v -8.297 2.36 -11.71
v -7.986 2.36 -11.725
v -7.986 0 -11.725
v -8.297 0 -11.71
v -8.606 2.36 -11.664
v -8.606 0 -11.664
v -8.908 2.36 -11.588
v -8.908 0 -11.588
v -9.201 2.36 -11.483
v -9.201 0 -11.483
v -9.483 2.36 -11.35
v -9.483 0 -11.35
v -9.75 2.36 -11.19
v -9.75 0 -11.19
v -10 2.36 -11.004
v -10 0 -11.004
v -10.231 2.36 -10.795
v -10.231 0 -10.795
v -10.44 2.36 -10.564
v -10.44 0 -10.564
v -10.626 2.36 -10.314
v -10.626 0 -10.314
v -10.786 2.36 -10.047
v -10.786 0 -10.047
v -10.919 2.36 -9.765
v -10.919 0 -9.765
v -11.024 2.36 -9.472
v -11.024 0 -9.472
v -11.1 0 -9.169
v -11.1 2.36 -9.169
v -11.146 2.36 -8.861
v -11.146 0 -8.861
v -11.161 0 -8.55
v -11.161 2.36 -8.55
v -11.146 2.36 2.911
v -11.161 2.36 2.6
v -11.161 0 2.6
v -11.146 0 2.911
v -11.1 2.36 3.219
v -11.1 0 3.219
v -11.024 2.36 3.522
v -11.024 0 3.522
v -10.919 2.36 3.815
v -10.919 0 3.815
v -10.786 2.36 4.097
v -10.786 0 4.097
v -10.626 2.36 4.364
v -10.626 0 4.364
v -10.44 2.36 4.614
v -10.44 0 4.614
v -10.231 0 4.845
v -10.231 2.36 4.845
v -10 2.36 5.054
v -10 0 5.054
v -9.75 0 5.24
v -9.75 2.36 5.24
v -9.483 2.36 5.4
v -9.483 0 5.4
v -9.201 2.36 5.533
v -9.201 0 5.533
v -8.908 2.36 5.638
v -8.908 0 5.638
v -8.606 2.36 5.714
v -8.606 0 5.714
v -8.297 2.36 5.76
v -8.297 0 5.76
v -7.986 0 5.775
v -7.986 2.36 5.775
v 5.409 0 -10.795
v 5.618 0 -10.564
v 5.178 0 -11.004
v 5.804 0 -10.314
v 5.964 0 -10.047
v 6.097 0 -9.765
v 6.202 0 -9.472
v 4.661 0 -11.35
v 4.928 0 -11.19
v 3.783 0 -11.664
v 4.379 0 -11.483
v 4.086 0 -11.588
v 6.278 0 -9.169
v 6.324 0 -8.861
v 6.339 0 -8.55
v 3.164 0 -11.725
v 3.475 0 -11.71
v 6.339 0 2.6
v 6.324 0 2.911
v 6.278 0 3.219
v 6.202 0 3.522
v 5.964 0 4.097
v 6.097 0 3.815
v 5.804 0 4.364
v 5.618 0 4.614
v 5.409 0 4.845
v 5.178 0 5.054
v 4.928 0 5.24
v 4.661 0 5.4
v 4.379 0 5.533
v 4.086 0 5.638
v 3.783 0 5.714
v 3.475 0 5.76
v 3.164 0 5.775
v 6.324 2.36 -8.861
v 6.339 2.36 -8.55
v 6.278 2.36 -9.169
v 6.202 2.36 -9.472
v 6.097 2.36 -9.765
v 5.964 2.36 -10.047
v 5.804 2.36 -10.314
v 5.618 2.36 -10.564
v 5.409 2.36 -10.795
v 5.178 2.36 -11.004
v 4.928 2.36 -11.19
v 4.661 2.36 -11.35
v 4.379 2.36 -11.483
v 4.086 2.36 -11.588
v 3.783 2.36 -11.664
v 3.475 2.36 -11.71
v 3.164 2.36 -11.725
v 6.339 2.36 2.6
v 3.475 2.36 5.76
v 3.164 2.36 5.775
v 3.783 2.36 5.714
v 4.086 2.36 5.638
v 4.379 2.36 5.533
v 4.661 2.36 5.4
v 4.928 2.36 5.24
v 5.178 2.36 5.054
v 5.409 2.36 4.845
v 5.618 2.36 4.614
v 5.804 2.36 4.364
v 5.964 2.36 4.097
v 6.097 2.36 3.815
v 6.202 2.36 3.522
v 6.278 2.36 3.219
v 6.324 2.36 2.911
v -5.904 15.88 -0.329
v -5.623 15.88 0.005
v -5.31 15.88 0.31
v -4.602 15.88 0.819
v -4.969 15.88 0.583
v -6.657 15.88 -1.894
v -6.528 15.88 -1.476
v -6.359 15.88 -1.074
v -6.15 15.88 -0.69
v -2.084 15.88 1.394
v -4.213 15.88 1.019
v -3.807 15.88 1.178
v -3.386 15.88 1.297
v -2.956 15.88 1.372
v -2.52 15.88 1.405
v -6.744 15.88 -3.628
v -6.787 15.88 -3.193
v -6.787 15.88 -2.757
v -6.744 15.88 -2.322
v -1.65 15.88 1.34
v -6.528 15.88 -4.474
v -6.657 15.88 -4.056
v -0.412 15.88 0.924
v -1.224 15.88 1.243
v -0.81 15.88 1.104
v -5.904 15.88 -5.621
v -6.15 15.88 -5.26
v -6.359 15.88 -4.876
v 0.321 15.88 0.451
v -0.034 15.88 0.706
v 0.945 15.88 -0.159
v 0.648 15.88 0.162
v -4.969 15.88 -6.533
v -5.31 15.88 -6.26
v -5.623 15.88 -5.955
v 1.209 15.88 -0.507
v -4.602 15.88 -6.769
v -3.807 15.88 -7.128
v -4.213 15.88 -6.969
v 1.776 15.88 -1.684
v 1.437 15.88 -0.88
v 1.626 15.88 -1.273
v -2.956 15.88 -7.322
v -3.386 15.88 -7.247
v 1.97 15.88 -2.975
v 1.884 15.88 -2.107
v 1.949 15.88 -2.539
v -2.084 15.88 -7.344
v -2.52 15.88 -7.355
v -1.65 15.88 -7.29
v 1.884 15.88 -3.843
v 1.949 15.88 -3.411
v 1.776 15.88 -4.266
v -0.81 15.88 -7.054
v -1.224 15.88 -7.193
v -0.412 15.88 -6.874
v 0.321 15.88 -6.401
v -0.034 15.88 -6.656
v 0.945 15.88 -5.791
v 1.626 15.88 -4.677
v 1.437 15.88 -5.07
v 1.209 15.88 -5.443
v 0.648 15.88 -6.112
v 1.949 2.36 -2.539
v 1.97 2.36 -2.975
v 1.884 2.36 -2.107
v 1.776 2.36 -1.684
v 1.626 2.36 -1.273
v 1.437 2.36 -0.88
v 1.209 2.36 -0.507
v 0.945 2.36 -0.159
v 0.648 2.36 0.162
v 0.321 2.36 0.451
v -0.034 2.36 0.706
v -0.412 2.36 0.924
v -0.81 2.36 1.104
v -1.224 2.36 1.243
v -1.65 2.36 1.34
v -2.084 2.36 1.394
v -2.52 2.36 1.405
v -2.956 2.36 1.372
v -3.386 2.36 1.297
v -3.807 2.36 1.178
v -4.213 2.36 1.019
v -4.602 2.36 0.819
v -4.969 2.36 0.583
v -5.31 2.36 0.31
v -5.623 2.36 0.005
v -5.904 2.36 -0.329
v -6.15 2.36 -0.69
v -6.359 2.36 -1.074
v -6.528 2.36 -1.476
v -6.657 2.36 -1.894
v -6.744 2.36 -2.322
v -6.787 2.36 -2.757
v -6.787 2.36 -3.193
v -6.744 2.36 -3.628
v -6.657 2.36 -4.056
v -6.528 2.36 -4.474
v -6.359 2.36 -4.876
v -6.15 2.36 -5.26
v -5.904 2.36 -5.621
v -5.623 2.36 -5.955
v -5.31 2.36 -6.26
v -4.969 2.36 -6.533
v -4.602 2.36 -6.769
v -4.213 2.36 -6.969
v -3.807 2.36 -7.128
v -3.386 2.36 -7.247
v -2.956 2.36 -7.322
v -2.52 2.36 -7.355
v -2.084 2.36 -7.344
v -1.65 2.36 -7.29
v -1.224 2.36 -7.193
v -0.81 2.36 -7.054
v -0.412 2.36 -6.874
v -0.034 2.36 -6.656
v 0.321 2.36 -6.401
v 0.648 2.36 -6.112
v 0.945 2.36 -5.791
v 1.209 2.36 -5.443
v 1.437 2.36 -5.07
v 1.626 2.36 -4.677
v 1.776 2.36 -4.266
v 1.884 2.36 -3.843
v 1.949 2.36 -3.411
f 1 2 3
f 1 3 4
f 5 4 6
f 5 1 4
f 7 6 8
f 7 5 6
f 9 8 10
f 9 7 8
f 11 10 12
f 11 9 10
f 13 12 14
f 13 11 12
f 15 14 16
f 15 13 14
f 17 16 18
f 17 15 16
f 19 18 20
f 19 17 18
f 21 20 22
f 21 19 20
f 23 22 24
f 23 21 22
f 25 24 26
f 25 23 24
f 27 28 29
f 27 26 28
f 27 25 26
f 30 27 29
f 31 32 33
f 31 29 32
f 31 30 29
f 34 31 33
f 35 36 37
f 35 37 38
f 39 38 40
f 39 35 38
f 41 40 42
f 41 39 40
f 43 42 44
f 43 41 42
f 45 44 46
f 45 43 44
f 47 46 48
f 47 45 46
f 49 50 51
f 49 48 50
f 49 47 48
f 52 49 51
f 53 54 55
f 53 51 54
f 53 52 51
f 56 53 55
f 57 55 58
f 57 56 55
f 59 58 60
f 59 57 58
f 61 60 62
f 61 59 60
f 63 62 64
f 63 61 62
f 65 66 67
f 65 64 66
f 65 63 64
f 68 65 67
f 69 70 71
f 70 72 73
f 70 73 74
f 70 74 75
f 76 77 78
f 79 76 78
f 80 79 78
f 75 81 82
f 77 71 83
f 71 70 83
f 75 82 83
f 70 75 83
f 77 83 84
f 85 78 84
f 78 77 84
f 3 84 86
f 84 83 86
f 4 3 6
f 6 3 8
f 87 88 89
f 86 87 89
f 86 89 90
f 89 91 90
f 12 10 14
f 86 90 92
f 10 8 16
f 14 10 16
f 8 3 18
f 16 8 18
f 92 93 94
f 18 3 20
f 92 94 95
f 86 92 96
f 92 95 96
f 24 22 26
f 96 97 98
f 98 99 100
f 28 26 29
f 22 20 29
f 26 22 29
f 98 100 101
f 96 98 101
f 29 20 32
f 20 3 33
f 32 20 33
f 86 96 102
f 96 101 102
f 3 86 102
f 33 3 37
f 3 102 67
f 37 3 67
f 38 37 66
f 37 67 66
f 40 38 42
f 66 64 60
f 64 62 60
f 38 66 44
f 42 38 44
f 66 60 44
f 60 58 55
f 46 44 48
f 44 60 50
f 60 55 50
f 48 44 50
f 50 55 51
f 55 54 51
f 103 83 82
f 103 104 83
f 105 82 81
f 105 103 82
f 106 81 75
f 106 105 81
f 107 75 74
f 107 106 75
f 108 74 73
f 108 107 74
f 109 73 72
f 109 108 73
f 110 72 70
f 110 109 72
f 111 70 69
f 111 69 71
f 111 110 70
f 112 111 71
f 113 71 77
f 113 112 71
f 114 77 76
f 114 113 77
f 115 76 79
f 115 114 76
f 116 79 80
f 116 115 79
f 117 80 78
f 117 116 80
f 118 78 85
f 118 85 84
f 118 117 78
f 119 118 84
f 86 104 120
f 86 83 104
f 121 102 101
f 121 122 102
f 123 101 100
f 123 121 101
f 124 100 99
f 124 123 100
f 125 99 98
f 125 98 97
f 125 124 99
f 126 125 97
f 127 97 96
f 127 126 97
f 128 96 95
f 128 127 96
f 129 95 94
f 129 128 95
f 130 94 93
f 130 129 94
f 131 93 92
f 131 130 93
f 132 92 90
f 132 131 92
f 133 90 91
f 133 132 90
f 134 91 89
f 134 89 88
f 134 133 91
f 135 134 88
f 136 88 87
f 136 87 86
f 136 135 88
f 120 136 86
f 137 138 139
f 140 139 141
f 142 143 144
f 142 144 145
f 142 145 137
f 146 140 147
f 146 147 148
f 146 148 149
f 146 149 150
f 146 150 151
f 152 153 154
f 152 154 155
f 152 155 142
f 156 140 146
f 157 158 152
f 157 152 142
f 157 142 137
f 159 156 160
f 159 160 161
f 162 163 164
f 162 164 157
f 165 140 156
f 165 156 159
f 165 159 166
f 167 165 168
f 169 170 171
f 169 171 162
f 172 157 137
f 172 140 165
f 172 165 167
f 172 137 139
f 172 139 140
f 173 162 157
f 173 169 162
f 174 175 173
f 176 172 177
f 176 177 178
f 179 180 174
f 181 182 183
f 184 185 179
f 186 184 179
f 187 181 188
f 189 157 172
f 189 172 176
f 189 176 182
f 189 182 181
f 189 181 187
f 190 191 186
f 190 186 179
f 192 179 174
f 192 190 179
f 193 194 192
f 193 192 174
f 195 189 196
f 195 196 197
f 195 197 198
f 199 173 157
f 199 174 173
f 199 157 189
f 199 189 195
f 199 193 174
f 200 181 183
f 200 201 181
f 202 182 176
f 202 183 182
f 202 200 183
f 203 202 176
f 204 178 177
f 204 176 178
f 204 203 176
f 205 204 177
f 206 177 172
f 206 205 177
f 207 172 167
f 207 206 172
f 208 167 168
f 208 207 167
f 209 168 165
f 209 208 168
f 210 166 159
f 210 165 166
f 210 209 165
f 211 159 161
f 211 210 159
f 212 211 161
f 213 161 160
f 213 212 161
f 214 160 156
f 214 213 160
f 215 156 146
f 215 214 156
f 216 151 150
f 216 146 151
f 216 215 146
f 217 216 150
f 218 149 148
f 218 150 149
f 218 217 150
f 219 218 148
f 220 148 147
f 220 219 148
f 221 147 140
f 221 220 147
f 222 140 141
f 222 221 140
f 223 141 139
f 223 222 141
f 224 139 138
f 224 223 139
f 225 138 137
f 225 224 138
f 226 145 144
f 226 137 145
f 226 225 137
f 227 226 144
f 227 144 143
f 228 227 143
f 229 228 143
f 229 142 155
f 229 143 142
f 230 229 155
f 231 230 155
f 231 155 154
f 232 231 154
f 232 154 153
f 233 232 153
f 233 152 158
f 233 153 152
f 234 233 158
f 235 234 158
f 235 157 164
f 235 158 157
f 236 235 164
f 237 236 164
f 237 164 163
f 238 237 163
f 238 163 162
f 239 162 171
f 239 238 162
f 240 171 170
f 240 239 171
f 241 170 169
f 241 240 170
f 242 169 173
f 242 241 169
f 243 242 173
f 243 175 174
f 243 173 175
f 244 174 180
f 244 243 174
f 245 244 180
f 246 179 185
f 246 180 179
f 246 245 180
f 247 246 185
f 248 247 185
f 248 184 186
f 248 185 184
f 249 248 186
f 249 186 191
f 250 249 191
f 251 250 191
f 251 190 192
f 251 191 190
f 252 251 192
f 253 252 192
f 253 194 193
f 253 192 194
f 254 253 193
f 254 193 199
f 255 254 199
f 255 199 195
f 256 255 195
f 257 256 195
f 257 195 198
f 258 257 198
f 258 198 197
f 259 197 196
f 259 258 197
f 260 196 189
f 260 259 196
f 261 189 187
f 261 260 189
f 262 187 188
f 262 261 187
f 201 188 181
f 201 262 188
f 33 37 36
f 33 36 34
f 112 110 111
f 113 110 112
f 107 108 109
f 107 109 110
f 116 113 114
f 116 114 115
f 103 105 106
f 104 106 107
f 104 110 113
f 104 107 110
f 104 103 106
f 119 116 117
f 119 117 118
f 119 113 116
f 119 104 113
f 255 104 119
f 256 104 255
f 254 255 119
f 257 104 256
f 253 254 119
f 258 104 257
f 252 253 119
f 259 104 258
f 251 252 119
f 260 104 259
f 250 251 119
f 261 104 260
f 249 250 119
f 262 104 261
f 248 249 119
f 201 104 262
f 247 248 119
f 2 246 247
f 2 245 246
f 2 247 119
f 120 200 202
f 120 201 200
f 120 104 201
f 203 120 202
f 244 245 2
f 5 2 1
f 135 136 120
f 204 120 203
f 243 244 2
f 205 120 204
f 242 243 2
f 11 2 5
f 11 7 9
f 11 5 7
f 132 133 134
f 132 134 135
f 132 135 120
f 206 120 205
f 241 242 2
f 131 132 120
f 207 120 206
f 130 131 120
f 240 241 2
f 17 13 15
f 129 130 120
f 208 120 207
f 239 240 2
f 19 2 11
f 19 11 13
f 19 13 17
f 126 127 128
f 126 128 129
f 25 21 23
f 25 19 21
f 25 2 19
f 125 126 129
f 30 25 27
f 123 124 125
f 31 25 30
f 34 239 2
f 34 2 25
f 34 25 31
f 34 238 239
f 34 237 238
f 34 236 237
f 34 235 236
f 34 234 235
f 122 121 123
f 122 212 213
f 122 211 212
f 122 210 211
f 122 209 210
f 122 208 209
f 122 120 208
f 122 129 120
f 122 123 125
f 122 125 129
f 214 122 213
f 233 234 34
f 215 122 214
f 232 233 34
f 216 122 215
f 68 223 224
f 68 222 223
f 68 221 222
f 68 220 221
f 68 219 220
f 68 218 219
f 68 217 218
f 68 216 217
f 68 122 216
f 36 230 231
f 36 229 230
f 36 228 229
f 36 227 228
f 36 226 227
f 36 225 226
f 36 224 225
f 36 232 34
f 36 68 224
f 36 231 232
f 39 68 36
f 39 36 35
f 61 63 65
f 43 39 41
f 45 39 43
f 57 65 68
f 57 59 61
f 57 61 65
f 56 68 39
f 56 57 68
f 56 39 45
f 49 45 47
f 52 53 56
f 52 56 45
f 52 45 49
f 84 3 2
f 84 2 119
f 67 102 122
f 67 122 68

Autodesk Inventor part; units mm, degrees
ref_plane "YZ Plane" through (0, 0, 0) normal (1, 0, 0) x (0, 1, 0)
ref_plane "XZ Plane" through (0, 0, 0) normal (0, 1, 0) x (-1, 0, 0)
ref_plane "XY Plane" through (0, 0, 0) normal (0, 0, 1) x (1, 0, 0)
sketch "Sketch1" plane through (0, 0, 0) normal (0, 1, 0) x (-1, 0, 0)
  line L0 (-6.3389, 5.775) -> (11.1611, 5.775)
  line L1 (11.1611, 5.775) -> (11.1611, -11.725)
  line L2 (11.1611, -11.725) -> (-6.3389, -11.725)
  line L3 (-6.3389, -11.725) -> (-6.3389, 5.775)
  point P0 (0, 0)
  dimension "d0" = 17.5
  dimension "d1" = 17.5
extrude "Extrusion1" add sketch "Sketch1" along normal blind 2.36
sketch "Sketch2" plane through (0, 2.36, 0) normal (0, 1, 0) x (1, 0, 0)
  circle A0 centre (-2.4111, 2.975) radius 4.3815
  point P0 (0, 0)
  dimension "d4" = 8.763
extrude "Extrusion2" add sketch "Sketch2" along normal blind 13.52
fillet "Fillet1" radius 3.175 4 edges at (6.3389, 1.18, 5.775) (-11.1611, 1.18, 5.775) (6.3389, 1.18, -11.725) (-11.1611, 1.18, -11.725)
properties part number "BNC_Up"
